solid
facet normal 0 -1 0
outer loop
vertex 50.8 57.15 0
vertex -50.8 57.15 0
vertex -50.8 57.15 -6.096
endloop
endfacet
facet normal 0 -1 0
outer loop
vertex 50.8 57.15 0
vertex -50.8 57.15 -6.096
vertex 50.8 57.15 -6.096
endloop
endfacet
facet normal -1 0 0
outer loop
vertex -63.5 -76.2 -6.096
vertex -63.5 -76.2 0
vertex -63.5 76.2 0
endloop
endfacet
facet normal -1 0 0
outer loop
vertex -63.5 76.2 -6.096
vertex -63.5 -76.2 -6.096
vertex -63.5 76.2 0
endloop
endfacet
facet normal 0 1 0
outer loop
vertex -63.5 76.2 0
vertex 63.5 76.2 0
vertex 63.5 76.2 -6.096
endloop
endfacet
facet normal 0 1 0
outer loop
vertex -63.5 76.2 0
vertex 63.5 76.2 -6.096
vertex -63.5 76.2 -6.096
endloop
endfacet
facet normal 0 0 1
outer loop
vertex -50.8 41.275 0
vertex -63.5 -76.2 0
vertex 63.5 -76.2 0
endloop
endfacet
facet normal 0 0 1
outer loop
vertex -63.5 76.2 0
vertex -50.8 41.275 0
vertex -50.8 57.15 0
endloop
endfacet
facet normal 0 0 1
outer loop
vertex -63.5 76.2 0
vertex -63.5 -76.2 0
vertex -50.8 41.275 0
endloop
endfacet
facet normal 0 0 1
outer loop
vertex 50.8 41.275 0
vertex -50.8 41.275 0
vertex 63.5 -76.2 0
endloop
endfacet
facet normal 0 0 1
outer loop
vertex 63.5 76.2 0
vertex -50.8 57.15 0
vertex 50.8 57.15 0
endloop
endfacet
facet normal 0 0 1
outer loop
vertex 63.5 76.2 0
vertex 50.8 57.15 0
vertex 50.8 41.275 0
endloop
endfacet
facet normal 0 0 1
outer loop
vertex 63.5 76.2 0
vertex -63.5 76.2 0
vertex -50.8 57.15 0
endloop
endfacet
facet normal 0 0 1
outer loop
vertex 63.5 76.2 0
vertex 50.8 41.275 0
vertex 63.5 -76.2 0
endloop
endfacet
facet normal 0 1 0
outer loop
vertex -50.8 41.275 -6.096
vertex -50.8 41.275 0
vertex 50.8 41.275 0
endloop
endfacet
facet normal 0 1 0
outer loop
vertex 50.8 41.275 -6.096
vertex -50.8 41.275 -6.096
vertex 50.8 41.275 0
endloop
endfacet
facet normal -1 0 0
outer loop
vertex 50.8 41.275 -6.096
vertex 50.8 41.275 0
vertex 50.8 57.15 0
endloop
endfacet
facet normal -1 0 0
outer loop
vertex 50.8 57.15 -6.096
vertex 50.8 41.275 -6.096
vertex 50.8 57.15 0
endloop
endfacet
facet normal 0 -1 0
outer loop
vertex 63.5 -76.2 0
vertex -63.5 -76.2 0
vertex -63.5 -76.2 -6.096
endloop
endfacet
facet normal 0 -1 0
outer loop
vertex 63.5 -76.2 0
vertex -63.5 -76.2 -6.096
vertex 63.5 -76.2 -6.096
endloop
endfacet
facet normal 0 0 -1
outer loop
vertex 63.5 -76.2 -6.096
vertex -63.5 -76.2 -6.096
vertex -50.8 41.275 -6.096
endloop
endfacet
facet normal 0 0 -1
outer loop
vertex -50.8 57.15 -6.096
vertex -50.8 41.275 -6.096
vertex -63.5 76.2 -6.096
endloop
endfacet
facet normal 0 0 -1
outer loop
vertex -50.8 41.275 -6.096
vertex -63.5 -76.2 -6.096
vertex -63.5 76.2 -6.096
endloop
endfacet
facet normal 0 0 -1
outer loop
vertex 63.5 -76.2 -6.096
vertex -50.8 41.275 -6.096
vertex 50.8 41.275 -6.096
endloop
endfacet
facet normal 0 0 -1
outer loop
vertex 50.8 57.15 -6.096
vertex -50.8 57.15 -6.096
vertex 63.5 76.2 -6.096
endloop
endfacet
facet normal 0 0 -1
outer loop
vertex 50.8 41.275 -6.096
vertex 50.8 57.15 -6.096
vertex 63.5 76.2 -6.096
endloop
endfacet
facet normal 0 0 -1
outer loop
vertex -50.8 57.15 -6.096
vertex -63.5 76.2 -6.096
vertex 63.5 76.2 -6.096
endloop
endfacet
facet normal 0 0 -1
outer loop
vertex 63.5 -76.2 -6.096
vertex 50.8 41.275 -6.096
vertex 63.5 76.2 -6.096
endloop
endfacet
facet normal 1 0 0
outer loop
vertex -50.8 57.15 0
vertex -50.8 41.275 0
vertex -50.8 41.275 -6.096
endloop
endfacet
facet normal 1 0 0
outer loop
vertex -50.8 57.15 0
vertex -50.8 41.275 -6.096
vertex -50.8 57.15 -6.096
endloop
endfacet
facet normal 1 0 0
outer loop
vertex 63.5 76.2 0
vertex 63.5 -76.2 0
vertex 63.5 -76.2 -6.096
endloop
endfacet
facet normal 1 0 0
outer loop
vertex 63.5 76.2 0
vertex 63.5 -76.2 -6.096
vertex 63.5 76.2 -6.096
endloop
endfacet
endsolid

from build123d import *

# Parameters (mm, degrees)
F0_W     = 101.6
F0_H     = 15.875
F0_W_2   = 6.096
F0_H_2   = 152.4
F1_DEPTH = 6.096


with BuildPart() as f1:
    # F0 (on Top) → F1 (new body)
    with BuildSketch(Plane.XY):
        Polygon((63.5, 76.2), (0, 76.2), (-57.404, 76.2), (-57.404, -76.2), (0, -76.2), (63.5, -76.2), align=None)
        with Locations((0, 49.2125)):
            Rectangle(F0_W, F0_H, mode=Mode.SUBTRACT)
        with Locations((-60.452, 0)):
            Rectangle(F0_W_2, F0_H_2)
    extrude(amount=-F1_DEPTH)


solid = f1.part
